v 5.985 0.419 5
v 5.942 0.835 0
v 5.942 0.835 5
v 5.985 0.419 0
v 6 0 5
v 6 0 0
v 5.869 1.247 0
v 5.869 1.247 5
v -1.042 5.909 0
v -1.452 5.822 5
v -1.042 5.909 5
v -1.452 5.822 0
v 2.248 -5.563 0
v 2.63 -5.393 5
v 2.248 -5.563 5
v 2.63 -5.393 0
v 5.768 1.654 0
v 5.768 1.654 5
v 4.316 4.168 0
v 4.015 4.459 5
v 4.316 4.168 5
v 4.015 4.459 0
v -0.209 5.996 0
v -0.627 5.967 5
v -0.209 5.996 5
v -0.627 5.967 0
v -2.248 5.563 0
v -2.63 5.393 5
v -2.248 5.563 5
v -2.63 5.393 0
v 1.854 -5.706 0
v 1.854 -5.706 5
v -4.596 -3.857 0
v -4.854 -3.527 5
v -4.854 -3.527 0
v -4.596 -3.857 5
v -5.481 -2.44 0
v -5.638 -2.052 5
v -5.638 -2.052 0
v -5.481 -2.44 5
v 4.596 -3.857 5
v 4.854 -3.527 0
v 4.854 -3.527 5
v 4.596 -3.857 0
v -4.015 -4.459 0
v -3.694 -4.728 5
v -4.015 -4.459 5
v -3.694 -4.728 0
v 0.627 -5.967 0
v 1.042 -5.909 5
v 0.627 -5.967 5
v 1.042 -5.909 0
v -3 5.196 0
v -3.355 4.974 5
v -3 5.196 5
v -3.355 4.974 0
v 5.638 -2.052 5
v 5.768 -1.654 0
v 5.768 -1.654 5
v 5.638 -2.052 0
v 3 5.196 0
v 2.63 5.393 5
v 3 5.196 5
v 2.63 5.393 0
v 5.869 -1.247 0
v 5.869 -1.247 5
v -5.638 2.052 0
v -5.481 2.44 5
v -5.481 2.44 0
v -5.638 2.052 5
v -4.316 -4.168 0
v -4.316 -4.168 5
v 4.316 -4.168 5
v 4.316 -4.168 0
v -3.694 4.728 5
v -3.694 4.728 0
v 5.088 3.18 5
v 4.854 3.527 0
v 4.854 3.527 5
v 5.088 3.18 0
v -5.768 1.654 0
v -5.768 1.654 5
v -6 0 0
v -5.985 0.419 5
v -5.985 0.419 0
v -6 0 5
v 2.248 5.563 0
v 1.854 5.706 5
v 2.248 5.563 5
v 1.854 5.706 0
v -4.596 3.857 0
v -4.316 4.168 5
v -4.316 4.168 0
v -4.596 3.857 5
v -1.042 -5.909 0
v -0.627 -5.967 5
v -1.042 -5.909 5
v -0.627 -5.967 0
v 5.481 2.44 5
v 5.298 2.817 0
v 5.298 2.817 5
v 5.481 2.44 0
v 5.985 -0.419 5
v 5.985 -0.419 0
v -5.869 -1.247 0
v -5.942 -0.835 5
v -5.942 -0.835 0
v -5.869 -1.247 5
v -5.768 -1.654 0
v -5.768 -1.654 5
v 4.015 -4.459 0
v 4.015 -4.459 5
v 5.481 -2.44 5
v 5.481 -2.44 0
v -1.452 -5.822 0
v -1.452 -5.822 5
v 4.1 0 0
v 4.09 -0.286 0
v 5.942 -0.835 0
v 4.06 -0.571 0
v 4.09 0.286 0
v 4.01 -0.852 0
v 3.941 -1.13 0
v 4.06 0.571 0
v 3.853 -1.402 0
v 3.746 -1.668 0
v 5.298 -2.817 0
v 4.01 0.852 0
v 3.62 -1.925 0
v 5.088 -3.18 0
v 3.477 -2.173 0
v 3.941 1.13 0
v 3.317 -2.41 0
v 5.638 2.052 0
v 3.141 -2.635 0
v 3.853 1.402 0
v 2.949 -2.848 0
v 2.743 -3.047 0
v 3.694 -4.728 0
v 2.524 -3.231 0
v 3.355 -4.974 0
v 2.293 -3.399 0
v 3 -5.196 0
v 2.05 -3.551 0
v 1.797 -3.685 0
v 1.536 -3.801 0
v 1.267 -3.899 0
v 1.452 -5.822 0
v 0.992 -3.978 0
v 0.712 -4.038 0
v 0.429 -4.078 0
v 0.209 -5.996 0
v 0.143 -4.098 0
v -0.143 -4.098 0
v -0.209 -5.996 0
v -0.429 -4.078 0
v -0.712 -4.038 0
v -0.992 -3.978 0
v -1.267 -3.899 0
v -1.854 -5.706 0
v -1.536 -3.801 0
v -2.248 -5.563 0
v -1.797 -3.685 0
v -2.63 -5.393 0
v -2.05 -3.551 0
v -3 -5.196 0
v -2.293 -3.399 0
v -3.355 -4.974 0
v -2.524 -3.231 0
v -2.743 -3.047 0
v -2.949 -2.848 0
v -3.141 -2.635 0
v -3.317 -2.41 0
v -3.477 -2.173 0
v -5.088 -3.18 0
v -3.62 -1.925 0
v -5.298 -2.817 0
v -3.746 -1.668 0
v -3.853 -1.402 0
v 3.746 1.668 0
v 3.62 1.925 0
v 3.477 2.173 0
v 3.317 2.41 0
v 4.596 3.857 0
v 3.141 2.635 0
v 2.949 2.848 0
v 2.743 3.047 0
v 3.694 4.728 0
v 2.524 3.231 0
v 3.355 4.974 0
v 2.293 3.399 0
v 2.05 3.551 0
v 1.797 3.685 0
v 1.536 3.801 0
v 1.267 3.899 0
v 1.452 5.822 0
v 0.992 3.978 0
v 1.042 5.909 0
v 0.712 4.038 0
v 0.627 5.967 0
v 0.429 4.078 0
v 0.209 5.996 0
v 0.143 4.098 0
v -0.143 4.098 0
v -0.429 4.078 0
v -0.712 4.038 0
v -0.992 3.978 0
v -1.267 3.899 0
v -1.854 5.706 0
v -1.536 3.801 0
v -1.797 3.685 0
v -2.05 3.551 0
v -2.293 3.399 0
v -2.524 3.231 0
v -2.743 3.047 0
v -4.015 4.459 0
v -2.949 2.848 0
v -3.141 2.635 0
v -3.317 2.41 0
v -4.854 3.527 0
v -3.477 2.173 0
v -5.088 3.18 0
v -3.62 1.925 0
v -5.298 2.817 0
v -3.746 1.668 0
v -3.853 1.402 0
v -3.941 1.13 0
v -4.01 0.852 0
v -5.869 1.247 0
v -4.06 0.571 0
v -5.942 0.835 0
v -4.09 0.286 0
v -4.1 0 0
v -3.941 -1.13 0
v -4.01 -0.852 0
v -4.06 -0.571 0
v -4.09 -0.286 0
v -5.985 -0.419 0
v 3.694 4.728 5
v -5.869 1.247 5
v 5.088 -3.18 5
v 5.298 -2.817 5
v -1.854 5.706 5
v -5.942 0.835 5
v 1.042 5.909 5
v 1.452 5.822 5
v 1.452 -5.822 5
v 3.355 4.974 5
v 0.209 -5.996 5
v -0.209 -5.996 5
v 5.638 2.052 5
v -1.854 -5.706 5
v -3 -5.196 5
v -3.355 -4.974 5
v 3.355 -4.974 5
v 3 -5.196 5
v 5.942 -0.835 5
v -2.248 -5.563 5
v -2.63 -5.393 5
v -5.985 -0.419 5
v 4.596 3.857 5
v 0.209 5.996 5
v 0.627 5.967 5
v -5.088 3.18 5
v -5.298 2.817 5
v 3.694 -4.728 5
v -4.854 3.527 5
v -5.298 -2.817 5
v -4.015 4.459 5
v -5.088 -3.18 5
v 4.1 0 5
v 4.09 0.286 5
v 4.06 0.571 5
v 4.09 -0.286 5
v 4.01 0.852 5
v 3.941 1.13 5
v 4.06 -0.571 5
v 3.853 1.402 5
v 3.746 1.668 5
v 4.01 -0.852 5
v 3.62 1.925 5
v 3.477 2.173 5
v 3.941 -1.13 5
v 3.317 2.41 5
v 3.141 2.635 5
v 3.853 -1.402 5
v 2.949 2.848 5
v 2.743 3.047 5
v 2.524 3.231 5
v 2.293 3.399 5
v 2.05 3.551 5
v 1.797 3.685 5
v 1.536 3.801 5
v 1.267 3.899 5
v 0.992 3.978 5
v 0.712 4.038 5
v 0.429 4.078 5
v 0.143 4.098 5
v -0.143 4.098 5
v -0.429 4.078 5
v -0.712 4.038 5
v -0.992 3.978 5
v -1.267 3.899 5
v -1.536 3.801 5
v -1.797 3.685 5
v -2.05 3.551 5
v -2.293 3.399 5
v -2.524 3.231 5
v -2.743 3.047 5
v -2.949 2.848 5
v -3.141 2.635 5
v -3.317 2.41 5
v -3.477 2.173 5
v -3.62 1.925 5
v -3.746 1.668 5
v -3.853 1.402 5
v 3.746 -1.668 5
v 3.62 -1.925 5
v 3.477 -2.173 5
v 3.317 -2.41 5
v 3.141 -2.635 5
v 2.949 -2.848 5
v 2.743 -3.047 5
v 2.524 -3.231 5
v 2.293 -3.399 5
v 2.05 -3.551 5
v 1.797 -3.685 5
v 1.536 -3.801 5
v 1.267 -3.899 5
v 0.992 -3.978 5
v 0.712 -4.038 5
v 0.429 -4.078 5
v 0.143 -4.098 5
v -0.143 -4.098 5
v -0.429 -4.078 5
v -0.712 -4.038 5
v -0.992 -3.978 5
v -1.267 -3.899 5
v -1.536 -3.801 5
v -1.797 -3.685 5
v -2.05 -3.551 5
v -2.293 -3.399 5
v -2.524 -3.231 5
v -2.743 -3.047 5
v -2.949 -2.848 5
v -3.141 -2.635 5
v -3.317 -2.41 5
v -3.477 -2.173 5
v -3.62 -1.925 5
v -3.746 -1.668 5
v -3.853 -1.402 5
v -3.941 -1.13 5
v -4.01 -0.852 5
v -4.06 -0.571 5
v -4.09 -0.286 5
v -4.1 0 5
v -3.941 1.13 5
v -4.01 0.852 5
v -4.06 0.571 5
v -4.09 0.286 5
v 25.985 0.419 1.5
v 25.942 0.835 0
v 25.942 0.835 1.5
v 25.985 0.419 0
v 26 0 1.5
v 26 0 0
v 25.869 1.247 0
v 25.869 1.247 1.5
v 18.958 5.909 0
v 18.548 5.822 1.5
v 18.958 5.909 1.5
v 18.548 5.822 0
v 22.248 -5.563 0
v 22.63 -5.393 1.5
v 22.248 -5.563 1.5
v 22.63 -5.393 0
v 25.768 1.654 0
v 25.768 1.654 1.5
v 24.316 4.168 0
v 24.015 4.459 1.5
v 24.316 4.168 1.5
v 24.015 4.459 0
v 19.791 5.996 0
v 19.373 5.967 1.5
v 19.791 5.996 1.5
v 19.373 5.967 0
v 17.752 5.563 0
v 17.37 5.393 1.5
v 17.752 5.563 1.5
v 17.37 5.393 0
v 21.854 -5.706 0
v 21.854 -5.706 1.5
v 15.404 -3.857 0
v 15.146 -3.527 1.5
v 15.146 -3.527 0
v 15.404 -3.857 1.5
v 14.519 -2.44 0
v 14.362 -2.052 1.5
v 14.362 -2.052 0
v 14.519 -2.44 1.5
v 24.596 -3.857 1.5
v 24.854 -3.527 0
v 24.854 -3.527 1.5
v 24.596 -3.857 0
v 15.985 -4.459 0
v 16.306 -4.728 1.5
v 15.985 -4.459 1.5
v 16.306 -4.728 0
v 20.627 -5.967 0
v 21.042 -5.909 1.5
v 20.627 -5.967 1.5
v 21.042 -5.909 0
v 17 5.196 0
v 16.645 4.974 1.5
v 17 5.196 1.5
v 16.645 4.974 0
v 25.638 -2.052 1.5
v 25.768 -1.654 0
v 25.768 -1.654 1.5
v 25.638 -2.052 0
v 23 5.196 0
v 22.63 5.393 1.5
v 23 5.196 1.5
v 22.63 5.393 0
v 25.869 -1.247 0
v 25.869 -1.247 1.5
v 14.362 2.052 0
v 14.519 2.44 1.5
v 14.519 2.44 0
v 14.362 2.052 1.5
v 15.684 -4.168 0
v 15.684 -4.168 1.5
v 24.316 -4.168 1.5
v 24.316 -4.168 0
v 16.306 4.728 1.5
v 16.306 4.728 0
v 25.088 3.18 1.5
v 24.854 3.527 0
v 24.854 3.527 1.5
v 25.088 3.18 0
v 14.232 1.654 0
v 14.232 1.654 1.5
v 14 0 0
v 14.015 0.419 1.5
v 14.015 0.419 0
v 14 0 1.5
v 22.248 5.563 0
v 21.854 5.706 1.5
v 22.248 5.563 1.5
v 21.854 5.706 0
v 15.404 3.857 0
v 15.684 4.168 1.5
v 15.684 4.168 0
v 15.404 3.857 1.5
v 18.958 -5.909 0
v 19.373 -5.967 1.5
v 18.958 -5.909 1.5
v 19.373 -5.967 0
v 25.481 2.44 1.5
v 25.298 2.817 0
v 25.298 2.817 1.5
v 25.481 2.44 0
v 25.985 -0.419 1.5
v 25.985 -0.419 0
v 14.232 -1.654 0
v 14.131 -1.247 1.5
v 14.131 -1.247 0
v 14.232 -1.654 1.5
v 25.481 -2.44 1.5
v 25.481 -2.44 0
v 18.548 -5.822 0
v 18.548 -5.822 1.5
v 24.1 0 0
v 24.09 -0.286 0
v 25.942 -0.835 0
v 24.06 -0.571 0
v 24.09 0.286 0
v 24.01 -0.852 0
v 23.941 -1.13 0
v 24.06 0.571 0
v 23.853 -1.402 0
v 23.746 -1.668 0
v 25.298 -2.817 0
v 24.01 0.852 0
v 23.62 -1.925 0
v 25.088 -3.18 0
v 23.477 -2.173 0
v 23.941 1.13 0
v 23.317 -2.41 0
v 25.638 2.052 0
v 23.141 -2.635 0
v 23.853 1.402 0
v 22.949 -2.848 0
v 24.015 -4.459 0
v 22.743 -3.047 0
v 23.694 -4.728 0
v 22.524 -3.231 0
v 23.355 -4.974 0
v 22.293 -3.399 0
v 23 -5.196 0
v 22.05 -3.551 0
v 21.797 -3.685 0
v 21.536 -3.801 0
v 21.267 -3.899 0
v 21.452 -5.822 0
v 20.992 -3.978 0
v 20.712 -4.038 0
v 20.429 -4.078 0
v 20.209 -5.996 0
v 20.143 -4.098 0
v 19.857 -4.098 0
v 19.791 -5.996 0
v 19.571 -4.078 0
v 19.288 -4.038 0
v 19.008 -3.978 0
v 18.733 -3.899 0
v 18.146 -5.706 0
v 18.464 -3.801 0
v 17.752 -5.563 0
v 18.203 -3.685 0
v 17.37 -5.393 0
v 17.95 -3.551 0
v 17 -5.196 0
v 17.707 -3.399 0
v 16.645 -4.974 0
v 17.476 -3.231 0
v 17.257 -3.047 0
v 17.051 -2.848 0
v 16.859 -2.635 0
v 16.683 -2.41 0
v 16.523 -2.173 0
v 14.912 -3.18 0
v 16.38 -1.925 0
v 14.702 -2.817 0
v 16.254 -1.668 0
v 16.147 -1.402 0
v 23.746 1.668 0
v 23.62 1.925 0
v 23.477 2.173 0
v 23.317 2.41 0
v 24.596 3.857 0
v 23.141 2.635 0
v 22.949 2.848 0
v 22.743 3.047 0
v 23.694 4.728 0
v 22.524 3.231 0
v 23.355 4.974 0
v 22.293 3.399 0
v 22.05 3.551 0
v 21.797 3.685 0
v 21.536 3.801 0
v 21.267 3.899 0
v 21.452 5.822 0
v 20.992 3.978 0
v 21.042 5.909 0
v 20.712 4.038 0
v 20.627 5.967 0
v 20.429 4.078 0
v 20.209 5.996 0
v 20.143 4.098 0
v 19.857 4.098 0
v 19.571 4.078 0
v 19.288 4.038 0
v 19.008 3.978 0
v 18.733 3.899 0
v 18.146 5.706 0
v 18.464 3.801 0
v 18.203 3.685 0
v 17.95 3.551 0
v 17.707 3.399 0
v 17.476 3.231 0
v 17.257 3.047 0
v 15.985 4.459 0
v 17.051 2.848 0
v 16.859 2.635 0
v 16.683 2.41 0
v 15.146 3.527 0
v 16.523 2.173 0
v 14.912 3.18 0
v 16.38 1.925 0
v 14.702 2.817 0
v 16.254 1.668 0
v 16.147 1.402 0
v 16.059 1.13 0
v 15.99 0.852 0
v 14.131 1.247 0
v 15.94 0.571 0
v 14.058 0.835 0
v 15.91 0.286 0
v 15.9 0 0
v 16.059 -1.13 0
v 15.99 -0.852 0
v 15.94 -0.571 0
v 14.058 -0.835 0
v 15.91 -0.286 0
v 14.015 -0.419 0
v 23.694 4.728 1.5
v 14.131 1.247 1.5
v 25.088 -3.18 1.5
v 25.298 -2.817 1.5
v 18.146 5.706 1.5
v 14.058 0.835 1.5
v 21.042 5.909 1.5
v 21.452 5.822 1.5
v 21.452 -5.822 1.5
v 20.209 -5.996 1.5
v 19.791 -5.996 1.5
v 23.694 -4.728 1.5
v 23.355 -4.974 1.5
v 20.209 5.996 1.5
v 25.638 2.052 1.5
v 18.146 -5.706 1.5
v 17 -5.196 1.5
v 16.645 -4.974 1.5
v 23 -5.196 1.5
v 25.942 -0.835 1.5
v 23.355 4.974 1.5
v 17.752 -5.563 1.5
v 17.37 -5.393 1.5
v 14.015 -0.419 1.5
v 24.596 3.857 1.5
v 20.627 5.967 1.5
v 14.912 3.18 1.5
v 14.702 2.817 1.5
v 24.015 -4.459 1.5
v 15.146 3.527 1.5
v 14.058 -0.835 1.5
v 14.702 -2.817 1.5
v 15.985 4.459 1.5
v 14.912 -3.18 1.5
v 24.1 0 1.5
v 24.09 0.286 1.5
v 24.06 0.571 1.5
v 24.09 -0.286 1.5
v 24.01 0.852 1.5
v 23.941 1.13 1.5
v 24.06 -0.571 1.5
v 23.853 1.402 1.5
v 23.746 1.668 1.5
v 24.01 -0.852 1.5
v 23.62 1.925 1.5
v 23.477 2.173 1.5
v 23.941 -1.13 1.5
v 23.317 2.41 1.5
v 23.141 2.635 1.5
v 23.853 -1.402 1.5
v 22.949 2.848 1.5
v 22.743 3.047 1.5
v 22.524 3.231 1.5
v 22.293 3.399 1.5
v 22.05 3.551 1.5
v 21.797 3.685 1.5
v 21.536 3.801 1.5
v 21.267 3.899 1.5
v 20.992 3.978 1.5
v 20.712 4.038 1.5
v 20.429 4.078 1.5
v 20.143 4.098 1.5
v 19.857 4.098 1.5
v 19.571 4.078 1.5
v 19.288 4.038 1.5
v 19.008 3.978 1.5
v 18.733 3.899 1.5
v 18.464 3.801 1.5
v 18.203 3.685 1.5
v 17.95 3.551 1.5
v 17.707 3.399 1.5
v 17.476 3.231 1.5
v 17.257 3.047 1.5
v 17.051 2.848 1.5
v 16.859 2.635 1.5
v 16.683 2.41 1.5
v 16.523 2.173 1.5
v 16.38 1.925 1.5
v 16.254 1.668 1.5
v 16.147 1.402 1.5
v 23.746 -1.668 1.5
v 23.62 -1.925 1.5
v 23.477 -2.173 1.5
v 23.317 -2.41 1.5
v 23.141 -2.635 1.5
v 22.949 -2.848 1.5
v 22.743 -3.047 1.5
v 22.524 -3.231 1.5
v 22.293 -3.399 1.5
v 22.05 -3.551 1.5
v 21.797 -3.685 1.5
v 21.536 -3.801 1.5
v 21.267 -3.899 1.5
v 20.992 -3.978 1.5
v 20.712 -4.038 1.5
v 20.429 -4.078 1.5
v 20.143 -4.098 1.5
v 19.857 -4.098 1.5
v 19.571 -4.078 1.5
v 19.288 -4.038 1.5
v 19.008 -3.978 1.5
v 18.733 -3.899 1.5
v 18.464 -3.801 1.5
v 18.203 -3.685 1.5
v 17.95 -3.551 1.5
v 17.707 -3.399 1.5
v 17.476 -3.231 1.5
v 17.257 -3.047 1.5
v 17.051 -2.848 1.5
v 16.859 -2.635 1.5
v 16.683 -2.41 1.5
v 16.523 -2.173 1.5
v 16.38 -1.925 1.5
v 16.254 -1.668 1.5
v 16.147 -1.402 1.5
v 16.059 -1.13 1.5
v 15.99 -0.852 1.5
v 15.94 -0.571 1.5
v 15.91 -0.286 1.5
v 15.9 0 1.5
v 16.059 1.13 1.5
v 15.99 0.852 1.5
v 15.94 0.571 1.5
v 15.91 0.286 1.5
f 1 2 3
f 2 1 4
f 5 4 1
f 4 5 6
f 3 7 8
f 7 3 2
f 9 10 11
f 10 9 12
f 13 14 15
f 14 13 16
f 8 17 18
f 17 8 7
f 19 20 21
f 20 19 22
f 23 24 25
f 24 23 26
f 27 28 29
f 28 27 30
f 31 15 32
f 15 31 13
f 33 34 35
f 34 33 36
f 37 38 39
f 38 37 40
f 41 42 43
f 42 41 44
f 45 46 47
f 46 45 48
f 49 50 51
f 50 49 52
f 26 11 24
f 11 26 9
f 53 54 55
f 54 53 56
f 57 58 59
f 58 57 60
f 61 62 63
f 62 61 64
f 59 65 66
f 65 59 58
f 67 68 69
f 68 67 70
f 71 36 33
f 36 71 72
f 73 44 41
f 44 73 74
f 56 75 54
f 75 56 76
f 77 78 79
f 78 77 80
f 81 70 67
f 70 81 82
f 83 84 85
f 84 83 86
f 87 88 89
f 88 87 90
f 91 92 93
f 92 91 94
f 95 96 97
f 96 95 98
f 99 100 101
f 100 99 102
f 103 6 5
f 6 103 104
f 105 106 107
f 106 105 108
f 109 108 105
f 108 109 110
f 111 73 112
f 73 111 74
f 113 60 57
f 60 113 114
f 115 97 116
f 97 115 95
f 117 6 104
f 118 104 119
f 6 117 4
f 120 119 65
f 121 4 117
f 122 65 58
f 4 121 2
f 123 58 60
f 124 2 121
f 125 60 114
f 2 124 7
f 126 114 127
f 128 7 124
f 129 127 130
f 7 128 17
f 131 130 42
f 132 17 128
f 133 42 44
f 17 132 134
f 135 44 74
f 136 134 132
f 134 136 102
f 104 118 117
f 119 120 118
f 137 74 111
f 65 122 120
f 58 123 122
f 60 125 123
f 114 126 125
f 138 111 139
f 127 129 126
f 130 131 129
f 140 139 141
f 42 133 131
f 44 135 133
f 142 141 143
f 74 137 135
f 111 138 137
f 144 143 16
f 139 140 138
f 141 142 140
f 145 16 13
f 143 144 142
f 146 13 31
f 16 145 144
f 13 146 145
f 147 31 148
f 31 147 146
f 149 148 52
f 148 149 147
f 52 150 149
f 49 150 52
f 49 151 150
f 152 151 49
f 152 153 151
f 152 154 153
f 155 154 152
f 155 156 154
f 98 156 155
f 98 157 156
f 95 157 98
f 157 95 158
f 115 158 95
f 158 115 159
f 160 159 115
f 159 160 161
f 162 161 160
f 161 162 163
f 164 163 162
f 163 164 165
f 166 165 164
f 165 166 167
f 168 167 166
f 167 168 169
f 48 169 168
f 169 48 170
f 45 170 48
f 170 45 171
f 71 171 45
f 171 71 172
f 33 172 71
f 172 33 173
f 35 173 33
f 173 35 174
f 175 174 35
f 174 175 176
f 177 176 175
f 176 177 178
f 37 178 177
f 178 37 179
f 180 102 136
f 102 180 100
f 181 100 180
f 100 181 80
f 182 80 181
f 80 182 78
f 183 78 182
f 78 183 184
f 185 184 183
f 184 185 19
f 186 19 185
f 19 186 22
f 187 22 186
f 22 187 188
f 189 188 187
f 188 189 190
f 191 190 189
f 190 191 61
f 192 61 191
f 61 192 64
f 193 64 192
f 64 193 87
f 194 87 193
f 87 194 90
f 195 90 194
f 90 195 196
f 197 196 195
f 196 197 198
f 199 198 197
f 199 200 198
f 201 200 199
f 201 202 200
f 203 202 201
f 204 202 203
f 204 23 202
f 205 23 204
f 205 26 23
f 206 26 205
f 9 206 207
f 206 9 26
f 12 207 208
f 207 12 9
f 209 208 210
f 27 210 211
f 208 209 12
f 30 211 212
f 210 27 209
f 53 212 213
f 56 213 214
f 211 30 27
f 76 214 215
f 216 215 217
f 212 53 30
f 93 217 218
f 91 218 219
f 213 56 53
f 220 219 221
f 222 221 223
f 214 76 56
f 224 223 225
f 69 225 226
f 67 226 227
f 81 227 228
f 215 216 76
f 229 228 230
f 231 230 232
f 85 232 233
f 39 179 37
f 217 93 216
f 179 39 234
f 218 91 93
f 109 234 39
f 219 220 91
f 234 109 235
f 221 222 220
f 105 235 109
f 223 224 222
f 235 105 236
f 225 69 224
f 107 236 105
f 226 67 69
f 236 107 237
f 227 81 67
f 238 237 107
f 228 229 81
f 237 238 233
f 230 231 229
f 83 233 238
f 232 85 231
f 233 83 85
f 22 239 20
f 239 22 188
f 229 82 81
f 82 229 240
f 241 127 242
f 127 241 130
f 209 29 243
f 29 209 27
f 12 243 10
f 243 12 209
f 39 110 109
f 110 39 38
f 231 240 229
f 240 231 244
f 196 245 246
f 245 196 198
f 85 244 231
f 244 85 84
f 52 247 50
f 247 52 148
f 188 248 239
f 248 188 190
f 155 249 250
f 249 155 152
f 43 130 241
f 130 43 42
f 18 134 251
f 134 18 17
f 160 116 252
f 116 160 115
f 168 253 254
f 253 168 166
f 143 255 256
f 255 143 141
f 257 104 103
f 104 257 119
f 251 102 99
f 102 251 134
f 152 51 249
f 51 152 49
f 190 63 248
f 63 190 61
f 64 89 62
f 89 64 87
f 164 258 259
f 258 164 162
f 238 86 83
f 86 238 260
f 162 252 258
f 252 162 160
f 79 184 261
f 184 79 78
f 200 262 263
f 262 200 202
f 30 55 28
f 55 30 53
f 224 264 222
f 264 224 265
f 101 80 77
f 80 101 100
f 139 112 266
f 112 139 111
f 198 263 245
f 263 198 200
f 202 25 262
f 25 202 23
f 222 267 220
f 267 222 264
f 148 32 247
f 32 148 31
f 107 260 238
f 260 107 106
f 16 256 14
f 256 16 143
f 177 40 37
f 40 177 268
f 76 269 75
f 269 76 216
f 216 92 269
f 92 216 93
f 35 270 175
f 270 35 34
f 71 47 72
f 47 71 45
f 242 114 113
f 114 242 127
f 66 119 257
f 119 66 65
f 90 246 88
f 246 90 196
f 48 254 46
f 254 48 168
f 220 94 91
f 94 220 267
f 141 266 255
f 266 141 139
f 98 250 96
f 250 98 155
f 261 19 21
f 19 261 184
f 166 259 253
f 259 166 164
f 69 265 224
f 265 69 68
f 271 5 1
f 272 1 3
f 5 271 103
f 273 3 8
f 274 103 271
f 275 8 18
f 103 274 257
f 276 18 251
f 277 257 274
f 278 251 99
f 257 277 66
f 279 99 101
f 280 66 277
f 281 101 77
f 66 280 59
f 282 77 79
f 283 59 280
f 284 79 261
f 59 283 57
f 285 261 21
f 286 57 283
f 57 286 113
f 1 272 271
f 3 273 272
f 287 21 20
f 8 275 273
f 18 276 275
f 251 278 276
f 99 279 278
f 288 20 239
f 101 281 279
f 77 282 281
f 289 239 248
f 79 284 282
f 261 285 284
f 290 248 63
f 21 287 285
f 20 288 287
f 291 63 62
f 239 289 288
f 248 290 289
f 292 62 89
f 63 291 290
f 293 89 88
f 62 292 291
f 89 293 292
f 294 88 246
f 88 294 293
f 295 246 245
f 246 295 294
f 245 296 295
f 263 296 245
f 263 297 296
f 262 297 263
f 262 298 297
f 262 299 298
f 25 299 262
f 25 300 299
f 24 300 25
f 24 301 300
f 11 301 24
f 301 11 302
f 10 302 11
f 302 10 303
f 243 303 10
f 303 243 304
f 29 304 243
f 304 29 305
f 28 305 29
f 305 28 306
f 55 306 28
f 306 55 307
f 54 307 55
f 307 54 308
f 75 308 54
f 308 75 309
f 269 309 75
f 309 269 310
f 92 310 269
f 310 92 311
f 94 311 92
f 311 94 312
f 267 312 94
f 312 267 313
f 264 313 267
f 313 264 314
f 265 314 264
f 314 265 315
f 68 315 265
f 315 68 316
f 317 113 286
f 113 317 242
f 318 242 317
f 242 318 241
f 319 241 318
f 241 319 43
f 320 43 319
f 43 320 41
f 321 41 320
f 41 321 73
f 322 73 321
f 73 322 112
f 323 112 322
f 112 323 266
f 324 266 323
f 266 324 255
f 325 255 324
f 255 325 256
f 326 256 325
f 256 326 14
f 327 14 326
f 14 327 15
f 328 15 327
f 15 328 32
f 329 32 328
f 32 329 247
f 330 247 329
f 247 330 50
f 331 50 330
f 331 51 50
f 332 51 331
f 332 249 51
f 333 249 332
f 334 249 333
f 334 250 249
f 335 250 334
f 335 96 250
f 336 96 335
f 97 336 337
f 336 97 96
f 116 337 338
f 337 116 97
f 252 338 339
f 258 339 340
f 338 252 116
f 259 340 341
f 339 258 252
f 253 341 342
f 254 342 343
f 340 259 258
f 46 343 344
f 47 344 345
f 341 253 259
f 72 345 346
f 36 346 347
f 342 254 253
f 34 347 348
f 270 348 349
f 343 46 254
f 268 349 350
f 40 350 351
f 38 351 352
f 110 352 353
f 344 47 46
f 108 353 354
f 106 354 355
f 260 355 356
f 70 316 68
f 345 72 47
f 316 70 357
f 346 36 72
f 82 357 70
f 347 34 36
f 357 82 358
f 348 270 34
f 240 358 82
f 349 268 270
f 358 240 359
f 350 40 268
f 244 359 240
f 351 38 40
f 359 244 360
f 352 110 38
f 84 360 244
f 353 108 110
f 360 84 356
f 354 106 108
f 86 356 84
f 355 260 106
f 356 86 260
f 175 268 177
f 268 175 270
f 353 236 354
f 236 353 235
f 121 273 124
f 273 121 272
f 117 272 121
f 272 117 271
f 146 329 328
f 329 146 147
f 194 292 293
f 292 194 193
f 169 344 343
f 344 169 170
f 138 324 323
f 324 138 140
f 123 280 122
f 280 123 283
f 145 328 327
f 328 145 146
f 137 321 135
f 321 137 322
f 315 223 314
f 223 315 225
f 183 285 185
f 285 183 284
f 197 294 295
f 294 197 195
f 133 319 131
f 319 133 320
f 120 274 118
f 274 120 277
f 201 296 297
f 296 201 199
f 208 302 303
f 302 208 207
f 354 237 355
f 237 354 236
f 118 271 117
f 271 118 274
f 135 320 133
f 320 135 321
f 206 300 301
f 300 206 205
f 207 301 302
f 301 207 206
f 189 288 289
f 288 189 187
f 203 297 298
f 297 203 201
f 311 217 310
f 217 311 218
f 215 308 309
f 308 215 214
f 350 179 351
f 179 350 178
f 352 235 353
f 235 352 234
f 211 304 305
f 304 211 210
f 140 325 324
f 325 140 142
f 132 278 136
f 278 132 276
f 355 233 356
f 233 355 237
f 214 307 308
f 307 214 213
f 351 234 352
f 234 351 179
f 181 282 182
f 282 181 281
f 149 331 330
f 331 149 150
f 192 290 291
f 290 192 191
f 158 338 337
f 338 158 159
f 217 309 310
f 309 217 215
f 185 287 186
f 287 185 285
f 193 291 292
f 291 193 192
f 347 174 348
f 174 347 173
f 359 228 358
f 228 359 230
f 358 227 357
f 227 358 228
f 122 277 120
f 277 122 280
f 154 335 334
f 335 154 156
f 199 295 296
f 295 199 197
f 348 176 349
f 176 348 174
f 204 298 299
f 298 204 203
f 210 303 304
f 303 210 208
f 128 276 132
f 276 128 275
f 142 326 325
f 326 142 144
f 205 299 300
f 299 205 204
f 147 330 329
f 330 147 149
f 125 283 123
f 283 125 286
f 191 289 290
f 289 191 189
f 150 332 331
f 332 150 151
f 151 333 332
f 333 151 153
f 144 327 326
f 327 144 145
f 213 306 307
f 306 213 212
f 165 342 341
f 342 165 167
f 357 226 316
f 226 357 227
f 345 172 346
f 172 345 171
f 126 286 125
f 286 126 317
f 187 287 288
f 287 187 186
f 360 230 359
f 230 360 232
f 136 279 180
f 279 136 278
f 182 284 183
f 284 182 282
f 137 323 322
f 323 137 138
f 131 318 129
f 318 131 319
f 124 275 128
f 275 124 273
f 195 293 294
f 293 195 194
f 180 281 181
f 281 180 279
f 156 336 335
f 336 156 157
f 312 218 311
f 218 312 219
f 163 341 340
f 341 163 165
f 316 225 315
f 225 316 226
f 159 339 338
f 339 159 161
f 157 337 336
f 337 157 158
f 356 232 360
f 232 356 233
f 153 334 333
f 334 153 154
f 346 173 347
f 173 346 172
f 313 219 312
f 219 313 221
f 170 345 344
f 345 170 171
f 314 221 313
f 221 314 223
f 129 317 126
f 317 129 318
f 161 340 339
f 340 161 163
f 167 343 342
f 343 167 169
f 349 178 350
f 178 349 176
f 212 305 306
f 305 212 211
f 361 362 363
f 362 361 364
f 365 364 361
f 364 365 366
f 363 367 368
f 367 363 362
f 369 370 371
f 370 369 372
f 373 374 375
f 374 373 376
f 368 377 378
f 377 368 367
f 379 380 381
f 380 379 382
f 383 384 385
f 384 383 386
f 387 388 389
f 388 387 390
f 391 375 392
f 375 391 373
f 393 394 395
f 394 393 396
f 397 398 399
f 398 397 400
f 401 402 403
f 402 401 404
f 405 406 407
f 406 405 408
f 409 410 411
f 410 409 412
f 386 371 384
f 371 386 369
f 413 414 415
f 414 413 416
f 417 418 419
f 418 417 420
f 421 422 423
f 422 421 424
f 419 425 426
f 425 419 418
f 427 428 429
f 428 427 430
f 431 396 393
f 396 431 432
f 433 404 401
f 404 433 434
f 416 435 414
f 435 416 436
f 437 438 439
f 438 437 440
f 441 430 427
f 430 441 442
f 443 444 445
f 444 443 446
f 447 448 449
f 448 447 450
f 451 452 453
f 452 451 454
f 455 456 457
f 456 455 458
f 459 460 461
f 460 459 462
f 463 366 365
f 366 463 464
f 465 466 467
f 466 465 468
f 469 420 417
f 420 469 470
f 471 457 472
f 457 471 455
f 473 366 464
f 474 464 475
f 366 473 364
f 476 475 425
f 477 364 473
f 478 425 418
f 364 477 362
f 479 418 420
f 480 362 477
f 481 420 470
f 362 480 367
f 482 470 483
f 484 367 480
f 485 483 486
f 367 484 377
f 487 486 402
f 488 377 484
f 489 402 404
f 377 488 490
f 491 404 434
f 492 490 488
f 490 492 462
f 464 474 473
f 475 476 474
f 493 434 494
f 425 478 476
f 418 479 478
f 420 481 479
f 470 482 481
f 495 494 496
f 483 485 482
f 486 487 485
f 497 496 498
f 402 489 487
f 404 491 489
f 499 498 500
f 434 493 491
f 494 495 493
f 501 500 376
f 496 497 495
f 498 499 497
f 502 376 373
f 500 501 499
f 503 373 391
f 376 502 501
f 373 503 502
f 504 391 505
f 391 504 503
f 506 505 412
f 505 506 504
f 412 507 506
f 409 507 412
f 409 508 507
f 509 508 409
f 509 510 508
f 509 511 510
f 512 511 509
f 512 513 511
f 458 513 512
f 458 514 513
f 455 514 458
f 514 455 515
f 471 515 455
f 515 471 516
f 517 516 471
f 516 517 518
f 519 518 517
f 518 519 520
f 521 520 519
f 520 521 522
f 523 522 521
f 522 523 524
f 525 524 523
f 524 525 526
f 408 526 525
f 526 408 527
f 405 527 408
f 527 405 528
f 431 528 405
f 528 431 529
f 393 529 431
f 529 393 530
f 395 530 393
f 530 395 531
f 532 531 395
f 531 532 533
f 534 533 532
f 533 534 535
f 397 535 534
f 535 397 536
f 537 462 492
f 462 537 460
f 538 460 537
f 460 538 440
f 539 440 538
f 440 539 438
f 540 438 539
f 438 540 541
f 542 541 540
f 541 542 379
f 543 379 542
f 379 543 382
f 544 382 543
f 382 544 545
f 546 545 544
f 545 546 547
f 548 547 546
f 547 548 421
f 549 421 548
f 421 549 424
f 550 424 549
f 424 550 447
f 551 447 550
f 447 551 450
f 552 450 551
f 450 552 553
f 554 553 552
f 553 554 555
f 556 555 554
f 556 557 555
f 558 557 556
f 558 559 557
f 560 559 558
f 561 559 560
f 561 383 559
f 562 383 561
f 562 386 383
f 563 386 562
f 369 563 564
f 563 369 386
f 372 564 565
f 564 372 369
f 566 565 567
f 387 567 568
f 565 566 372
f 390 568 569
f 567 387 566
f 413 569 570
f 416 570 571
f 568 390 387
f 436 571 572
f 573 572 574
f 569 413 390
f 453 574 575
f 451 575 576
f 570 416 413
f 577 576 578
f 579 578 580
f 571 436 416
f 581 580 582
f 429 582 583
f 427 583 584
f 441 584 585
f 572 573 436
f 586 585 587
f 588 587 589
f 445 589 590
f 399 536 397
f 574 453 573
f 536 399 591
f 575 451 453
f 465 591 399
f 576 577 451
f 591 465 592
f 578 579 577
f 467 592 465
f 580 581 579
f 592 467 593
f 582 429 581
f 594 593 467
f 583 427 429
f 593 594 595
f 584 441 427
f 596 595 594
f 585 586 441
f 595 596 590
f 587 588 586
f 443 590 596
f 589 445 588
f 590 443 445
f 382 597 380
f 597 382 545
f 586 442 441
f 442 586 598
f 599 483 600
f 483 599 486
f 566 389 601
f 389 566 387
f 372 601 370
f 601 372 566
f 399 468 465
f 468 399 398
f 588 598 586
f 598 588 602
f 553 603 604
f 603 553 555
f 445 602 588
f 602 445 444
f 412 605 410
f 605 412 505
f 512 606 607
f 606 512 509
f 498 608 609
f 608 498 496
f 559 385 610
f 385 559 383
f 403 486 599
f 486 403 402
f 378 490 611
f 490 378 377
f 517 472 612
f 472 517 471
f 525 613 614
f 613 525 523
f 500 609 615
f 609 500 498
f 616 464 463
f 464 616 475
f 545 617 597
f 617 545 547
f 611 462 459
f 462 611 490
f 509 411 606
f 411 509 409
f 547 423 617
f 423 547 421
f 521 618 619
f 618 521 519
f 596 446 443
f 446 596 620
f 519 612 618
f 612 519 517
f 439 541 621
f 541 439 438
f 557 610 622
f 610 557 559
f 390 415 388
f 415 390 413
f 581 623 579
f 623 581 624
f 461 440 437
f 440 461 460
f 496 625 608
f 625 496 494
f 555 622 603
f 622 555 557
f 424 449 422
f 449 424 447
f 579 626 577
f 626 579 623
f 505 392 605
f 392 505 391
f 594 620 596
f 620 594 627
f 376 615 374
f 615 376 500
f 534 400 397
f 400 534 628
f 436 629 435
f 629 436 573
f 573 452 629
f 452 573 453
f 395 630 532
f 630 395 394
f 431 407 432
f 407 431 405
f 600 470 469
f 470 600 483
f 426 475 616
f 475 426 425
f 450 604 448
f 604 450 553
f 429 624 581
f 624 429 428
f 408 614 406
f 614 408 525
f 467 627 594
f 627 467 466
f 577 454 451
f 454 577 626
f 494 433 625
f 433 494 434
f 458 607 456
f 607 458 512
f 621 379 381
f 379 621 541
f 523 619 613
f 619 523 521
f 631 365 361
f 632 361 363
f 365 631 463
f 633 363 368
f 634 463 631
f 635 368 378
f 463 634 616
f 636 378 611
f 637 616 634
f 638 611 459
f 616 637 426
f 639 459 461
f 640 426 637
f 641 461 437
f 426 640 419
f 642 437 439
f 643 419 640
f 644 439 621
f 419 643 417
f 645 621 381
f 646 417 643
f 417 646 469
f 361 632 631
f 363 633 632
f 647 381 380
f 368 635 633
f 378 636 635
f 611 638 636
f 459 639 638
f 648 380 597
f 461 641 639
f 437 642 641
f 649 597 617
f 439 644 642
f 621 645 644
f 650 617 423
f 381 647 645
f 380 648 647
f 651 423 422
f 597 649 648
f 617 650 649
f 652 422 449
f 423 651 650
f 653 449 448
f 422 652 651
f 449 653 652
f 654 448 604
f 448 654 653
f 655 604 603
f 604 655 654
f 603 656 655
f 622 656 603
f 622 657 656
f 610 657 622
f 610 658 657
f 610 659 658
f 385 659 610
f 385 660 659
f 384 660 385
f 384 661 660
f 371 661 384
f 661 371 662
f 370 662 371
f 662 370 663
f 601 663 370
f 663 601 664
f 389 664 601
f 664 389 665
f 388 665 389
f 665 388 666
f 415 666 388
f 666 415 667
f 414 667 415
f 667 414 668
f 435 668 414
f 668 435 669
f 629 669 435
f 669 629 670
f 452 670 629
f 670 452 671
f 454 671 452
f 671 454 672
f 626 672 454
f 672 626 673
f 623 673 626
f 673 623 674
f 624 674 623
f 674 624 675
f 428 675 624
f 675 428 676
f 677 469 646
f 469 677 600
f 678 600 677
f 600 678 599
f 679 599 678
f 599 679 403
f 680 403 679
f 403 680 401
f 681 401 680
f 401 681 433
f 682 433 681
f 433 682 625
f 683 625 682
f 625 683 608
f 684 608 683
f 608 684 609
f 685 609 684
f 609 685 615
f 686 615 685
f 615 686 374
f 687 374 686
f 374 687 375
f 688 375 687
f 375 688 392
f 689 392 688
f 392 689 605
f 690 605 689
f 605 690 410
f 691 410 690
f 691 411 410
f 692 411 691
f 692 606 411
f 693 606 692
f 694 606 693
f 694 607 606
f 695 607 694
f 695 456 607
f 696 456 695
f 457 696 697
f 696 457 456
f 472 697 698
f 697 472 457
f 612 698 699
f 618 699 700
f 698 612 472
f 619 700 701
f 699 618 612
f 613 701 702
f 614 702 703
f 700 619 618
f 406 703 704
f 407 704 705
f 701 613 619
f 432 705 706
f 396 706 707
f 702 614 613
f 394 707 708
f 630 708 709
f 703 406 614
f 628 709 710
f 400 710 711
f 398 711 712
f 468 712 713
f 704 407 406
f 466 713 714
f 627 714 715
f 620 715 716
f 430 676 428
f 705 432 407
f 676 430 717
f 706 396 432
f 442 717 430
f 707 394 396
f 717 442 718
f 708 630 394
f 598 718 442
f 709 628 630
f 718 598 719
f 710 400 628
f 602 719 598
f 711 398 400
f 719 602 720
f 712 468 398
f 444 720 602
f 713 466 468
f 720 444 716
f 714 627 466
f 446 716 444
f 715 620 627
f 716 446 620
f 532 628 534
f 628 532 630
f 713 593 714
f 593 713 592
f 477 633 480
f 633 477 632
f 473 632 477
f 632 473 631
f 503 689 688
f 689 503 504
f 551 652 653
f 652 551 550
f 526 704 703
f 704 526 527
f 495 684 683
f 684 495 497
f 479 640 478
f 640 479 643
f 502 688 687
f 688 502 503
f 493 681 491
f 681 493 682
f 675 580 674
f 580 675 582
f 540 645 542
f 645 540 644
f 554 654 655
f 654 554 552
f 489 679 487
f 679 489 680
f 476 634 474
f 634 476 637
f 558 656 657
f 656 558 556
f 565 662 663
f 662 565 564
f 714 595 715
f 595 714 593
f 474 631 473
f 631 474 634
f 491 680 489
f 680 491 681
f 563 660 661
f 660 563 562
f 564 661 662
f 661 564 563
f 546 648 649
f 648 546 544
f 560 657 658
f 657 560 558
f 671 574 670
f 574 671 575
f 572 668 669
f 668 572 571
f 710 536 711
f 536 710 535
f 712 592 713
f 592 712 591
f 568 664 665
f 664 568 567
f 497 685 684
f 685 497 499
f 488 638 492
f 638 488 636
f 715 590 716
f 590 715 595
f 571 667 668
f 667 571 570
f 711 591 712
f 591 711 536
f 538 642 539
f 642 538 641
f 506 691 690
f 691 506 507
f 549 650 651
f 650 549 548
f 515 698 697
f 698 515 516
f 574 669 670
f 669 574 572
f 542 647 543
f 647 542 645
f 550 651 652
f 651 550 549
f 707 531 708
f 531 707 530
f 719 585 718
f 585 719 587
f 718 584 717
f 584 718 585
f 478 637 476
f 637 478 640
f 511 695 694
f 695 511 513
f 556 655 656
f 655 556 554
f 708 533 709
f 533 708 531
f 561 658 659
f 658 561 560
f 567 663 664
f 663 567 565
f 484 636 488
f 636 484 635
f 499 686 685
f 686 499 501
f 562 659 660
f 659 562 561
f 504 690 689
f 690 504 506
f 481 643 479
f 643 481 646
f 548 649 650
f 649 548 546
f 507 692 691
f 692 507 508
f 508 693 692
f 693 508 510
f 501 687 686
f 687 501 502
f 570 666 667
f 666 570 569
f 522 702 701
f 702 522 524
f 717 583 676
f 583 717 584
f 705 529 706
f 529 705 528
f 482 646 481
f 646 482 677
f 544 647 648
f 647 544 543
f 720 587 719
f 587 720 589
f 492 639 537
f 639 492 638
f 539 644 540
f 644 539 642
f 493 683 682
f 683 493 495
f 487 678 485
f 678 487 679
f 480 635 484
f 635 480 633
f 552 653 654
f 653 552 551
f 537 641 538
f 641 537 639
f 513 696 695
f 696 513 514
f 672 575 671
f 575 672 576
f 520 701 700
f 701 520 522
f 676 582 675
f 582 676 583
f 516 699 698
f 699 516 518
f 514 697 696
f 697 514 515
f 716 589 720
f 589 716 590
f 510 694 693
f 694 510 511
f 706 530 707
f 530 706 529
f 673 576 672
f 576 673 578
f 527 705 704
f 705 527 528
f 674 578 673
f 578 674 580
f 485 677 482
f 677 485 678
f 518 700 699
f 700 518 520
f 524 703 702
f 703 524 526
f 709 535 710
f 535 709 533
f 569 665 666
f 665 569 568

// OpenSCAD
// file: ../888_3007.scad
include <../parameters.scad>

module 888_3007(h=5) {
    difference()
    {
        cylinder(d=12,h=h,$fn=90);
        cylinder(d=8.2,h=3*h,center=true,$fn=90);
    }
    
}


888_3007();

//translate([20,0,0])
//888_3007(1.5);
// file: ../../parameters.scad
maximum_printable_size = 150;

layer_thickness = 0.3;
global_clearance = 0.5;


//Screw diameter and nut for M10 [mm]
M10_screw_diameter = 10.4;
M10_head_height = 10;
M10_head_diameter = 16+0.5;
M10_nut_height = 10.5;
M10_nut_diameter = 25.5;
M10_nut_pocket = 22.3;

//Screw diameter for M8 [mm]
M8_screw_diameter = 8.6;
M8_head_height = 8;
M8_head_diameter = 13.5;
M8_nut_height = 7.5;
M8_square_nut_thin_height = 4.5;
M8_nut_diameter = 14.4 + 0.5;
M8_nut_pocket = 13 + 0.5;
M8_washer_diameter = 16;
M8_washer_thickness = 1.5;


//Screw diameter and nut for M6 [mm]
M6_screw_diameter=6.5;
M6_head_diameter = 10+0.5;
M6_head_height = 6;
M6_nut_height = 4.9;
M6_nut_diameter = 11.8;
M6_nut_pocket = 10.4;
M6_square_nut_height = 3;
M6_square_nut_diameter = 10;
M6_washer_thickness = 1.6;

//Screw diameter and nut for M5 [mm]
M5_screw_diameter=5.5;
M5_head_height = 5;
M5_head_diameter = 13+0.5;
M5_nut_height = 4.5;
M5_nut_diameter = 9.4;
M5_nut_pocket = 8.4;

//Screw diameter and nut for M4 [mm]
M4_screw_diameter=4.5;
M4_screw_head_height = 4;
M4_nut_height = 3.2;
M4_nut_diameter = 8.4;
M4_nut_pocket = 7.5;

//Screw diameter and nut for M3 [mm]
M3_screw_diameter = 3.2;
M3_nut_height = 2.7;
M3_nut_diameter = 6.6;
M3_nut_pocket = 5.6;
M3_screw_head_height = 3;

//Screw diameter and nut for M2,5 [mm]
M2_5_screw_diameter = 2.7;
M2_5_nut_height = 2.3;
M2_5_nut_diameter = 6;
M2_5_nut_pocket = 5.5;

//ALU profile
ALU_profile_width = 30.5;
ALU_profile_holder_wall_thickness = 3;
ALU_profile_groove_width = 8;





// Platform parameters ////////////////////////////////////////////
// Main profile parameters
starting_platform_length = 1000; // Main platform profile length
starting_platform_angle = 10; // Angle of attack for platform

// Main cube profile lengths
profile_length_x = 600;
profile_length_y = 600;
profile_length_z = 260;


// Compressor dimensions
compressor_length_x = 410;
compressor_length_y = 140;
compressor_length_z = 310;

// Platform front support parameters
front_holder_width = 160;
front_holder_angle = 25;
front_holder_height = 60;
front_holder_offset = 15;
front_holder_height_offset = 110;

// Lock moving servo parameters
// static par.
servo_length = 40;
servo_width = 20;
servo_height = 40;
servo_axle_offset = 12.5;
servo_axle_height = 5;
servo_movement_angle = 60;
servo_movement_angle_offset = -35; // angle offset up
servo_force = 1.65; // [N/m] torque of servo

// dynamic par.
servo_arm_length = servo_width/2+ALU_profile_width/2+ALU_profile_holder_wall_thickness+4;
servo_travel_y = cos((servo_movement_angle-abs(servo_movement_angle_offset))/2)*servo_arm_length;
servo_arm_hole_length = (servo_arm_length/cos(servo_movement_angle/2))-servo_arm_length+M3_screw_diameter;
servo_joint_offset = sin(servo_movement_angle+servo_movement_angle_offset)*(servo_arm_length+servo_arm_hole_length)+servo_axle_offset;
servo_joint_offset_by_angle = -tan(servo_movement_angle_offset)*servo_arm_length;
servo_max_linear_force = servo_force/(servo_arm_length/1000); // max servo linear force [N]
servo_min_linear_force = cos(servo_movement_angle+abs(servo_movement_angle_offset))*servo_max_linear_force; // min servo linear force [N] in the most extreme position
servo_holding_linear_force = cos(servo_movement_angle+servo_movement_angle_offset)*servo_max_linear_force; // min servo linear force [N] in holding position

// Lock static parameters
lock_screws_dia = 3.2;
lock_depth = 20;
lock_axle_diameter = 15;
lock_grab_axle_dia = 13;
lock_arms_joint_offset = 30;
lock_arms_joint_angle = 90-.01;
lock_tooth_width = 2;

lock_tube_angle = 0;

// Lock dynamic parameters
lock_push_force = (servo_holding_linear_force/cos(lock_arms_joint_angle))/cos(lock_arms_joint_angle); // lock arm pushing force on linear servo joint
lock_push_arm_length = 45;
lock_arm_force_ratio = 1; // lock arm change holding force ratio (0.5 = arm will have half holding force)
lock_hold_arm_length = lock_push_arm_length/lock_arm_force_ratio;
lock_holding_force = lock_push_force*lock_arm_force_ratio;
lock_joint_arm_length = lock_push_arm_length;
// main file
//@set_slicing_config(../../slicing/default.ini)
include <../../parameters.scad>

use <../888_3007.scad>


888_3007(5);

translate([20,0,0])
888_3007(1.5);
